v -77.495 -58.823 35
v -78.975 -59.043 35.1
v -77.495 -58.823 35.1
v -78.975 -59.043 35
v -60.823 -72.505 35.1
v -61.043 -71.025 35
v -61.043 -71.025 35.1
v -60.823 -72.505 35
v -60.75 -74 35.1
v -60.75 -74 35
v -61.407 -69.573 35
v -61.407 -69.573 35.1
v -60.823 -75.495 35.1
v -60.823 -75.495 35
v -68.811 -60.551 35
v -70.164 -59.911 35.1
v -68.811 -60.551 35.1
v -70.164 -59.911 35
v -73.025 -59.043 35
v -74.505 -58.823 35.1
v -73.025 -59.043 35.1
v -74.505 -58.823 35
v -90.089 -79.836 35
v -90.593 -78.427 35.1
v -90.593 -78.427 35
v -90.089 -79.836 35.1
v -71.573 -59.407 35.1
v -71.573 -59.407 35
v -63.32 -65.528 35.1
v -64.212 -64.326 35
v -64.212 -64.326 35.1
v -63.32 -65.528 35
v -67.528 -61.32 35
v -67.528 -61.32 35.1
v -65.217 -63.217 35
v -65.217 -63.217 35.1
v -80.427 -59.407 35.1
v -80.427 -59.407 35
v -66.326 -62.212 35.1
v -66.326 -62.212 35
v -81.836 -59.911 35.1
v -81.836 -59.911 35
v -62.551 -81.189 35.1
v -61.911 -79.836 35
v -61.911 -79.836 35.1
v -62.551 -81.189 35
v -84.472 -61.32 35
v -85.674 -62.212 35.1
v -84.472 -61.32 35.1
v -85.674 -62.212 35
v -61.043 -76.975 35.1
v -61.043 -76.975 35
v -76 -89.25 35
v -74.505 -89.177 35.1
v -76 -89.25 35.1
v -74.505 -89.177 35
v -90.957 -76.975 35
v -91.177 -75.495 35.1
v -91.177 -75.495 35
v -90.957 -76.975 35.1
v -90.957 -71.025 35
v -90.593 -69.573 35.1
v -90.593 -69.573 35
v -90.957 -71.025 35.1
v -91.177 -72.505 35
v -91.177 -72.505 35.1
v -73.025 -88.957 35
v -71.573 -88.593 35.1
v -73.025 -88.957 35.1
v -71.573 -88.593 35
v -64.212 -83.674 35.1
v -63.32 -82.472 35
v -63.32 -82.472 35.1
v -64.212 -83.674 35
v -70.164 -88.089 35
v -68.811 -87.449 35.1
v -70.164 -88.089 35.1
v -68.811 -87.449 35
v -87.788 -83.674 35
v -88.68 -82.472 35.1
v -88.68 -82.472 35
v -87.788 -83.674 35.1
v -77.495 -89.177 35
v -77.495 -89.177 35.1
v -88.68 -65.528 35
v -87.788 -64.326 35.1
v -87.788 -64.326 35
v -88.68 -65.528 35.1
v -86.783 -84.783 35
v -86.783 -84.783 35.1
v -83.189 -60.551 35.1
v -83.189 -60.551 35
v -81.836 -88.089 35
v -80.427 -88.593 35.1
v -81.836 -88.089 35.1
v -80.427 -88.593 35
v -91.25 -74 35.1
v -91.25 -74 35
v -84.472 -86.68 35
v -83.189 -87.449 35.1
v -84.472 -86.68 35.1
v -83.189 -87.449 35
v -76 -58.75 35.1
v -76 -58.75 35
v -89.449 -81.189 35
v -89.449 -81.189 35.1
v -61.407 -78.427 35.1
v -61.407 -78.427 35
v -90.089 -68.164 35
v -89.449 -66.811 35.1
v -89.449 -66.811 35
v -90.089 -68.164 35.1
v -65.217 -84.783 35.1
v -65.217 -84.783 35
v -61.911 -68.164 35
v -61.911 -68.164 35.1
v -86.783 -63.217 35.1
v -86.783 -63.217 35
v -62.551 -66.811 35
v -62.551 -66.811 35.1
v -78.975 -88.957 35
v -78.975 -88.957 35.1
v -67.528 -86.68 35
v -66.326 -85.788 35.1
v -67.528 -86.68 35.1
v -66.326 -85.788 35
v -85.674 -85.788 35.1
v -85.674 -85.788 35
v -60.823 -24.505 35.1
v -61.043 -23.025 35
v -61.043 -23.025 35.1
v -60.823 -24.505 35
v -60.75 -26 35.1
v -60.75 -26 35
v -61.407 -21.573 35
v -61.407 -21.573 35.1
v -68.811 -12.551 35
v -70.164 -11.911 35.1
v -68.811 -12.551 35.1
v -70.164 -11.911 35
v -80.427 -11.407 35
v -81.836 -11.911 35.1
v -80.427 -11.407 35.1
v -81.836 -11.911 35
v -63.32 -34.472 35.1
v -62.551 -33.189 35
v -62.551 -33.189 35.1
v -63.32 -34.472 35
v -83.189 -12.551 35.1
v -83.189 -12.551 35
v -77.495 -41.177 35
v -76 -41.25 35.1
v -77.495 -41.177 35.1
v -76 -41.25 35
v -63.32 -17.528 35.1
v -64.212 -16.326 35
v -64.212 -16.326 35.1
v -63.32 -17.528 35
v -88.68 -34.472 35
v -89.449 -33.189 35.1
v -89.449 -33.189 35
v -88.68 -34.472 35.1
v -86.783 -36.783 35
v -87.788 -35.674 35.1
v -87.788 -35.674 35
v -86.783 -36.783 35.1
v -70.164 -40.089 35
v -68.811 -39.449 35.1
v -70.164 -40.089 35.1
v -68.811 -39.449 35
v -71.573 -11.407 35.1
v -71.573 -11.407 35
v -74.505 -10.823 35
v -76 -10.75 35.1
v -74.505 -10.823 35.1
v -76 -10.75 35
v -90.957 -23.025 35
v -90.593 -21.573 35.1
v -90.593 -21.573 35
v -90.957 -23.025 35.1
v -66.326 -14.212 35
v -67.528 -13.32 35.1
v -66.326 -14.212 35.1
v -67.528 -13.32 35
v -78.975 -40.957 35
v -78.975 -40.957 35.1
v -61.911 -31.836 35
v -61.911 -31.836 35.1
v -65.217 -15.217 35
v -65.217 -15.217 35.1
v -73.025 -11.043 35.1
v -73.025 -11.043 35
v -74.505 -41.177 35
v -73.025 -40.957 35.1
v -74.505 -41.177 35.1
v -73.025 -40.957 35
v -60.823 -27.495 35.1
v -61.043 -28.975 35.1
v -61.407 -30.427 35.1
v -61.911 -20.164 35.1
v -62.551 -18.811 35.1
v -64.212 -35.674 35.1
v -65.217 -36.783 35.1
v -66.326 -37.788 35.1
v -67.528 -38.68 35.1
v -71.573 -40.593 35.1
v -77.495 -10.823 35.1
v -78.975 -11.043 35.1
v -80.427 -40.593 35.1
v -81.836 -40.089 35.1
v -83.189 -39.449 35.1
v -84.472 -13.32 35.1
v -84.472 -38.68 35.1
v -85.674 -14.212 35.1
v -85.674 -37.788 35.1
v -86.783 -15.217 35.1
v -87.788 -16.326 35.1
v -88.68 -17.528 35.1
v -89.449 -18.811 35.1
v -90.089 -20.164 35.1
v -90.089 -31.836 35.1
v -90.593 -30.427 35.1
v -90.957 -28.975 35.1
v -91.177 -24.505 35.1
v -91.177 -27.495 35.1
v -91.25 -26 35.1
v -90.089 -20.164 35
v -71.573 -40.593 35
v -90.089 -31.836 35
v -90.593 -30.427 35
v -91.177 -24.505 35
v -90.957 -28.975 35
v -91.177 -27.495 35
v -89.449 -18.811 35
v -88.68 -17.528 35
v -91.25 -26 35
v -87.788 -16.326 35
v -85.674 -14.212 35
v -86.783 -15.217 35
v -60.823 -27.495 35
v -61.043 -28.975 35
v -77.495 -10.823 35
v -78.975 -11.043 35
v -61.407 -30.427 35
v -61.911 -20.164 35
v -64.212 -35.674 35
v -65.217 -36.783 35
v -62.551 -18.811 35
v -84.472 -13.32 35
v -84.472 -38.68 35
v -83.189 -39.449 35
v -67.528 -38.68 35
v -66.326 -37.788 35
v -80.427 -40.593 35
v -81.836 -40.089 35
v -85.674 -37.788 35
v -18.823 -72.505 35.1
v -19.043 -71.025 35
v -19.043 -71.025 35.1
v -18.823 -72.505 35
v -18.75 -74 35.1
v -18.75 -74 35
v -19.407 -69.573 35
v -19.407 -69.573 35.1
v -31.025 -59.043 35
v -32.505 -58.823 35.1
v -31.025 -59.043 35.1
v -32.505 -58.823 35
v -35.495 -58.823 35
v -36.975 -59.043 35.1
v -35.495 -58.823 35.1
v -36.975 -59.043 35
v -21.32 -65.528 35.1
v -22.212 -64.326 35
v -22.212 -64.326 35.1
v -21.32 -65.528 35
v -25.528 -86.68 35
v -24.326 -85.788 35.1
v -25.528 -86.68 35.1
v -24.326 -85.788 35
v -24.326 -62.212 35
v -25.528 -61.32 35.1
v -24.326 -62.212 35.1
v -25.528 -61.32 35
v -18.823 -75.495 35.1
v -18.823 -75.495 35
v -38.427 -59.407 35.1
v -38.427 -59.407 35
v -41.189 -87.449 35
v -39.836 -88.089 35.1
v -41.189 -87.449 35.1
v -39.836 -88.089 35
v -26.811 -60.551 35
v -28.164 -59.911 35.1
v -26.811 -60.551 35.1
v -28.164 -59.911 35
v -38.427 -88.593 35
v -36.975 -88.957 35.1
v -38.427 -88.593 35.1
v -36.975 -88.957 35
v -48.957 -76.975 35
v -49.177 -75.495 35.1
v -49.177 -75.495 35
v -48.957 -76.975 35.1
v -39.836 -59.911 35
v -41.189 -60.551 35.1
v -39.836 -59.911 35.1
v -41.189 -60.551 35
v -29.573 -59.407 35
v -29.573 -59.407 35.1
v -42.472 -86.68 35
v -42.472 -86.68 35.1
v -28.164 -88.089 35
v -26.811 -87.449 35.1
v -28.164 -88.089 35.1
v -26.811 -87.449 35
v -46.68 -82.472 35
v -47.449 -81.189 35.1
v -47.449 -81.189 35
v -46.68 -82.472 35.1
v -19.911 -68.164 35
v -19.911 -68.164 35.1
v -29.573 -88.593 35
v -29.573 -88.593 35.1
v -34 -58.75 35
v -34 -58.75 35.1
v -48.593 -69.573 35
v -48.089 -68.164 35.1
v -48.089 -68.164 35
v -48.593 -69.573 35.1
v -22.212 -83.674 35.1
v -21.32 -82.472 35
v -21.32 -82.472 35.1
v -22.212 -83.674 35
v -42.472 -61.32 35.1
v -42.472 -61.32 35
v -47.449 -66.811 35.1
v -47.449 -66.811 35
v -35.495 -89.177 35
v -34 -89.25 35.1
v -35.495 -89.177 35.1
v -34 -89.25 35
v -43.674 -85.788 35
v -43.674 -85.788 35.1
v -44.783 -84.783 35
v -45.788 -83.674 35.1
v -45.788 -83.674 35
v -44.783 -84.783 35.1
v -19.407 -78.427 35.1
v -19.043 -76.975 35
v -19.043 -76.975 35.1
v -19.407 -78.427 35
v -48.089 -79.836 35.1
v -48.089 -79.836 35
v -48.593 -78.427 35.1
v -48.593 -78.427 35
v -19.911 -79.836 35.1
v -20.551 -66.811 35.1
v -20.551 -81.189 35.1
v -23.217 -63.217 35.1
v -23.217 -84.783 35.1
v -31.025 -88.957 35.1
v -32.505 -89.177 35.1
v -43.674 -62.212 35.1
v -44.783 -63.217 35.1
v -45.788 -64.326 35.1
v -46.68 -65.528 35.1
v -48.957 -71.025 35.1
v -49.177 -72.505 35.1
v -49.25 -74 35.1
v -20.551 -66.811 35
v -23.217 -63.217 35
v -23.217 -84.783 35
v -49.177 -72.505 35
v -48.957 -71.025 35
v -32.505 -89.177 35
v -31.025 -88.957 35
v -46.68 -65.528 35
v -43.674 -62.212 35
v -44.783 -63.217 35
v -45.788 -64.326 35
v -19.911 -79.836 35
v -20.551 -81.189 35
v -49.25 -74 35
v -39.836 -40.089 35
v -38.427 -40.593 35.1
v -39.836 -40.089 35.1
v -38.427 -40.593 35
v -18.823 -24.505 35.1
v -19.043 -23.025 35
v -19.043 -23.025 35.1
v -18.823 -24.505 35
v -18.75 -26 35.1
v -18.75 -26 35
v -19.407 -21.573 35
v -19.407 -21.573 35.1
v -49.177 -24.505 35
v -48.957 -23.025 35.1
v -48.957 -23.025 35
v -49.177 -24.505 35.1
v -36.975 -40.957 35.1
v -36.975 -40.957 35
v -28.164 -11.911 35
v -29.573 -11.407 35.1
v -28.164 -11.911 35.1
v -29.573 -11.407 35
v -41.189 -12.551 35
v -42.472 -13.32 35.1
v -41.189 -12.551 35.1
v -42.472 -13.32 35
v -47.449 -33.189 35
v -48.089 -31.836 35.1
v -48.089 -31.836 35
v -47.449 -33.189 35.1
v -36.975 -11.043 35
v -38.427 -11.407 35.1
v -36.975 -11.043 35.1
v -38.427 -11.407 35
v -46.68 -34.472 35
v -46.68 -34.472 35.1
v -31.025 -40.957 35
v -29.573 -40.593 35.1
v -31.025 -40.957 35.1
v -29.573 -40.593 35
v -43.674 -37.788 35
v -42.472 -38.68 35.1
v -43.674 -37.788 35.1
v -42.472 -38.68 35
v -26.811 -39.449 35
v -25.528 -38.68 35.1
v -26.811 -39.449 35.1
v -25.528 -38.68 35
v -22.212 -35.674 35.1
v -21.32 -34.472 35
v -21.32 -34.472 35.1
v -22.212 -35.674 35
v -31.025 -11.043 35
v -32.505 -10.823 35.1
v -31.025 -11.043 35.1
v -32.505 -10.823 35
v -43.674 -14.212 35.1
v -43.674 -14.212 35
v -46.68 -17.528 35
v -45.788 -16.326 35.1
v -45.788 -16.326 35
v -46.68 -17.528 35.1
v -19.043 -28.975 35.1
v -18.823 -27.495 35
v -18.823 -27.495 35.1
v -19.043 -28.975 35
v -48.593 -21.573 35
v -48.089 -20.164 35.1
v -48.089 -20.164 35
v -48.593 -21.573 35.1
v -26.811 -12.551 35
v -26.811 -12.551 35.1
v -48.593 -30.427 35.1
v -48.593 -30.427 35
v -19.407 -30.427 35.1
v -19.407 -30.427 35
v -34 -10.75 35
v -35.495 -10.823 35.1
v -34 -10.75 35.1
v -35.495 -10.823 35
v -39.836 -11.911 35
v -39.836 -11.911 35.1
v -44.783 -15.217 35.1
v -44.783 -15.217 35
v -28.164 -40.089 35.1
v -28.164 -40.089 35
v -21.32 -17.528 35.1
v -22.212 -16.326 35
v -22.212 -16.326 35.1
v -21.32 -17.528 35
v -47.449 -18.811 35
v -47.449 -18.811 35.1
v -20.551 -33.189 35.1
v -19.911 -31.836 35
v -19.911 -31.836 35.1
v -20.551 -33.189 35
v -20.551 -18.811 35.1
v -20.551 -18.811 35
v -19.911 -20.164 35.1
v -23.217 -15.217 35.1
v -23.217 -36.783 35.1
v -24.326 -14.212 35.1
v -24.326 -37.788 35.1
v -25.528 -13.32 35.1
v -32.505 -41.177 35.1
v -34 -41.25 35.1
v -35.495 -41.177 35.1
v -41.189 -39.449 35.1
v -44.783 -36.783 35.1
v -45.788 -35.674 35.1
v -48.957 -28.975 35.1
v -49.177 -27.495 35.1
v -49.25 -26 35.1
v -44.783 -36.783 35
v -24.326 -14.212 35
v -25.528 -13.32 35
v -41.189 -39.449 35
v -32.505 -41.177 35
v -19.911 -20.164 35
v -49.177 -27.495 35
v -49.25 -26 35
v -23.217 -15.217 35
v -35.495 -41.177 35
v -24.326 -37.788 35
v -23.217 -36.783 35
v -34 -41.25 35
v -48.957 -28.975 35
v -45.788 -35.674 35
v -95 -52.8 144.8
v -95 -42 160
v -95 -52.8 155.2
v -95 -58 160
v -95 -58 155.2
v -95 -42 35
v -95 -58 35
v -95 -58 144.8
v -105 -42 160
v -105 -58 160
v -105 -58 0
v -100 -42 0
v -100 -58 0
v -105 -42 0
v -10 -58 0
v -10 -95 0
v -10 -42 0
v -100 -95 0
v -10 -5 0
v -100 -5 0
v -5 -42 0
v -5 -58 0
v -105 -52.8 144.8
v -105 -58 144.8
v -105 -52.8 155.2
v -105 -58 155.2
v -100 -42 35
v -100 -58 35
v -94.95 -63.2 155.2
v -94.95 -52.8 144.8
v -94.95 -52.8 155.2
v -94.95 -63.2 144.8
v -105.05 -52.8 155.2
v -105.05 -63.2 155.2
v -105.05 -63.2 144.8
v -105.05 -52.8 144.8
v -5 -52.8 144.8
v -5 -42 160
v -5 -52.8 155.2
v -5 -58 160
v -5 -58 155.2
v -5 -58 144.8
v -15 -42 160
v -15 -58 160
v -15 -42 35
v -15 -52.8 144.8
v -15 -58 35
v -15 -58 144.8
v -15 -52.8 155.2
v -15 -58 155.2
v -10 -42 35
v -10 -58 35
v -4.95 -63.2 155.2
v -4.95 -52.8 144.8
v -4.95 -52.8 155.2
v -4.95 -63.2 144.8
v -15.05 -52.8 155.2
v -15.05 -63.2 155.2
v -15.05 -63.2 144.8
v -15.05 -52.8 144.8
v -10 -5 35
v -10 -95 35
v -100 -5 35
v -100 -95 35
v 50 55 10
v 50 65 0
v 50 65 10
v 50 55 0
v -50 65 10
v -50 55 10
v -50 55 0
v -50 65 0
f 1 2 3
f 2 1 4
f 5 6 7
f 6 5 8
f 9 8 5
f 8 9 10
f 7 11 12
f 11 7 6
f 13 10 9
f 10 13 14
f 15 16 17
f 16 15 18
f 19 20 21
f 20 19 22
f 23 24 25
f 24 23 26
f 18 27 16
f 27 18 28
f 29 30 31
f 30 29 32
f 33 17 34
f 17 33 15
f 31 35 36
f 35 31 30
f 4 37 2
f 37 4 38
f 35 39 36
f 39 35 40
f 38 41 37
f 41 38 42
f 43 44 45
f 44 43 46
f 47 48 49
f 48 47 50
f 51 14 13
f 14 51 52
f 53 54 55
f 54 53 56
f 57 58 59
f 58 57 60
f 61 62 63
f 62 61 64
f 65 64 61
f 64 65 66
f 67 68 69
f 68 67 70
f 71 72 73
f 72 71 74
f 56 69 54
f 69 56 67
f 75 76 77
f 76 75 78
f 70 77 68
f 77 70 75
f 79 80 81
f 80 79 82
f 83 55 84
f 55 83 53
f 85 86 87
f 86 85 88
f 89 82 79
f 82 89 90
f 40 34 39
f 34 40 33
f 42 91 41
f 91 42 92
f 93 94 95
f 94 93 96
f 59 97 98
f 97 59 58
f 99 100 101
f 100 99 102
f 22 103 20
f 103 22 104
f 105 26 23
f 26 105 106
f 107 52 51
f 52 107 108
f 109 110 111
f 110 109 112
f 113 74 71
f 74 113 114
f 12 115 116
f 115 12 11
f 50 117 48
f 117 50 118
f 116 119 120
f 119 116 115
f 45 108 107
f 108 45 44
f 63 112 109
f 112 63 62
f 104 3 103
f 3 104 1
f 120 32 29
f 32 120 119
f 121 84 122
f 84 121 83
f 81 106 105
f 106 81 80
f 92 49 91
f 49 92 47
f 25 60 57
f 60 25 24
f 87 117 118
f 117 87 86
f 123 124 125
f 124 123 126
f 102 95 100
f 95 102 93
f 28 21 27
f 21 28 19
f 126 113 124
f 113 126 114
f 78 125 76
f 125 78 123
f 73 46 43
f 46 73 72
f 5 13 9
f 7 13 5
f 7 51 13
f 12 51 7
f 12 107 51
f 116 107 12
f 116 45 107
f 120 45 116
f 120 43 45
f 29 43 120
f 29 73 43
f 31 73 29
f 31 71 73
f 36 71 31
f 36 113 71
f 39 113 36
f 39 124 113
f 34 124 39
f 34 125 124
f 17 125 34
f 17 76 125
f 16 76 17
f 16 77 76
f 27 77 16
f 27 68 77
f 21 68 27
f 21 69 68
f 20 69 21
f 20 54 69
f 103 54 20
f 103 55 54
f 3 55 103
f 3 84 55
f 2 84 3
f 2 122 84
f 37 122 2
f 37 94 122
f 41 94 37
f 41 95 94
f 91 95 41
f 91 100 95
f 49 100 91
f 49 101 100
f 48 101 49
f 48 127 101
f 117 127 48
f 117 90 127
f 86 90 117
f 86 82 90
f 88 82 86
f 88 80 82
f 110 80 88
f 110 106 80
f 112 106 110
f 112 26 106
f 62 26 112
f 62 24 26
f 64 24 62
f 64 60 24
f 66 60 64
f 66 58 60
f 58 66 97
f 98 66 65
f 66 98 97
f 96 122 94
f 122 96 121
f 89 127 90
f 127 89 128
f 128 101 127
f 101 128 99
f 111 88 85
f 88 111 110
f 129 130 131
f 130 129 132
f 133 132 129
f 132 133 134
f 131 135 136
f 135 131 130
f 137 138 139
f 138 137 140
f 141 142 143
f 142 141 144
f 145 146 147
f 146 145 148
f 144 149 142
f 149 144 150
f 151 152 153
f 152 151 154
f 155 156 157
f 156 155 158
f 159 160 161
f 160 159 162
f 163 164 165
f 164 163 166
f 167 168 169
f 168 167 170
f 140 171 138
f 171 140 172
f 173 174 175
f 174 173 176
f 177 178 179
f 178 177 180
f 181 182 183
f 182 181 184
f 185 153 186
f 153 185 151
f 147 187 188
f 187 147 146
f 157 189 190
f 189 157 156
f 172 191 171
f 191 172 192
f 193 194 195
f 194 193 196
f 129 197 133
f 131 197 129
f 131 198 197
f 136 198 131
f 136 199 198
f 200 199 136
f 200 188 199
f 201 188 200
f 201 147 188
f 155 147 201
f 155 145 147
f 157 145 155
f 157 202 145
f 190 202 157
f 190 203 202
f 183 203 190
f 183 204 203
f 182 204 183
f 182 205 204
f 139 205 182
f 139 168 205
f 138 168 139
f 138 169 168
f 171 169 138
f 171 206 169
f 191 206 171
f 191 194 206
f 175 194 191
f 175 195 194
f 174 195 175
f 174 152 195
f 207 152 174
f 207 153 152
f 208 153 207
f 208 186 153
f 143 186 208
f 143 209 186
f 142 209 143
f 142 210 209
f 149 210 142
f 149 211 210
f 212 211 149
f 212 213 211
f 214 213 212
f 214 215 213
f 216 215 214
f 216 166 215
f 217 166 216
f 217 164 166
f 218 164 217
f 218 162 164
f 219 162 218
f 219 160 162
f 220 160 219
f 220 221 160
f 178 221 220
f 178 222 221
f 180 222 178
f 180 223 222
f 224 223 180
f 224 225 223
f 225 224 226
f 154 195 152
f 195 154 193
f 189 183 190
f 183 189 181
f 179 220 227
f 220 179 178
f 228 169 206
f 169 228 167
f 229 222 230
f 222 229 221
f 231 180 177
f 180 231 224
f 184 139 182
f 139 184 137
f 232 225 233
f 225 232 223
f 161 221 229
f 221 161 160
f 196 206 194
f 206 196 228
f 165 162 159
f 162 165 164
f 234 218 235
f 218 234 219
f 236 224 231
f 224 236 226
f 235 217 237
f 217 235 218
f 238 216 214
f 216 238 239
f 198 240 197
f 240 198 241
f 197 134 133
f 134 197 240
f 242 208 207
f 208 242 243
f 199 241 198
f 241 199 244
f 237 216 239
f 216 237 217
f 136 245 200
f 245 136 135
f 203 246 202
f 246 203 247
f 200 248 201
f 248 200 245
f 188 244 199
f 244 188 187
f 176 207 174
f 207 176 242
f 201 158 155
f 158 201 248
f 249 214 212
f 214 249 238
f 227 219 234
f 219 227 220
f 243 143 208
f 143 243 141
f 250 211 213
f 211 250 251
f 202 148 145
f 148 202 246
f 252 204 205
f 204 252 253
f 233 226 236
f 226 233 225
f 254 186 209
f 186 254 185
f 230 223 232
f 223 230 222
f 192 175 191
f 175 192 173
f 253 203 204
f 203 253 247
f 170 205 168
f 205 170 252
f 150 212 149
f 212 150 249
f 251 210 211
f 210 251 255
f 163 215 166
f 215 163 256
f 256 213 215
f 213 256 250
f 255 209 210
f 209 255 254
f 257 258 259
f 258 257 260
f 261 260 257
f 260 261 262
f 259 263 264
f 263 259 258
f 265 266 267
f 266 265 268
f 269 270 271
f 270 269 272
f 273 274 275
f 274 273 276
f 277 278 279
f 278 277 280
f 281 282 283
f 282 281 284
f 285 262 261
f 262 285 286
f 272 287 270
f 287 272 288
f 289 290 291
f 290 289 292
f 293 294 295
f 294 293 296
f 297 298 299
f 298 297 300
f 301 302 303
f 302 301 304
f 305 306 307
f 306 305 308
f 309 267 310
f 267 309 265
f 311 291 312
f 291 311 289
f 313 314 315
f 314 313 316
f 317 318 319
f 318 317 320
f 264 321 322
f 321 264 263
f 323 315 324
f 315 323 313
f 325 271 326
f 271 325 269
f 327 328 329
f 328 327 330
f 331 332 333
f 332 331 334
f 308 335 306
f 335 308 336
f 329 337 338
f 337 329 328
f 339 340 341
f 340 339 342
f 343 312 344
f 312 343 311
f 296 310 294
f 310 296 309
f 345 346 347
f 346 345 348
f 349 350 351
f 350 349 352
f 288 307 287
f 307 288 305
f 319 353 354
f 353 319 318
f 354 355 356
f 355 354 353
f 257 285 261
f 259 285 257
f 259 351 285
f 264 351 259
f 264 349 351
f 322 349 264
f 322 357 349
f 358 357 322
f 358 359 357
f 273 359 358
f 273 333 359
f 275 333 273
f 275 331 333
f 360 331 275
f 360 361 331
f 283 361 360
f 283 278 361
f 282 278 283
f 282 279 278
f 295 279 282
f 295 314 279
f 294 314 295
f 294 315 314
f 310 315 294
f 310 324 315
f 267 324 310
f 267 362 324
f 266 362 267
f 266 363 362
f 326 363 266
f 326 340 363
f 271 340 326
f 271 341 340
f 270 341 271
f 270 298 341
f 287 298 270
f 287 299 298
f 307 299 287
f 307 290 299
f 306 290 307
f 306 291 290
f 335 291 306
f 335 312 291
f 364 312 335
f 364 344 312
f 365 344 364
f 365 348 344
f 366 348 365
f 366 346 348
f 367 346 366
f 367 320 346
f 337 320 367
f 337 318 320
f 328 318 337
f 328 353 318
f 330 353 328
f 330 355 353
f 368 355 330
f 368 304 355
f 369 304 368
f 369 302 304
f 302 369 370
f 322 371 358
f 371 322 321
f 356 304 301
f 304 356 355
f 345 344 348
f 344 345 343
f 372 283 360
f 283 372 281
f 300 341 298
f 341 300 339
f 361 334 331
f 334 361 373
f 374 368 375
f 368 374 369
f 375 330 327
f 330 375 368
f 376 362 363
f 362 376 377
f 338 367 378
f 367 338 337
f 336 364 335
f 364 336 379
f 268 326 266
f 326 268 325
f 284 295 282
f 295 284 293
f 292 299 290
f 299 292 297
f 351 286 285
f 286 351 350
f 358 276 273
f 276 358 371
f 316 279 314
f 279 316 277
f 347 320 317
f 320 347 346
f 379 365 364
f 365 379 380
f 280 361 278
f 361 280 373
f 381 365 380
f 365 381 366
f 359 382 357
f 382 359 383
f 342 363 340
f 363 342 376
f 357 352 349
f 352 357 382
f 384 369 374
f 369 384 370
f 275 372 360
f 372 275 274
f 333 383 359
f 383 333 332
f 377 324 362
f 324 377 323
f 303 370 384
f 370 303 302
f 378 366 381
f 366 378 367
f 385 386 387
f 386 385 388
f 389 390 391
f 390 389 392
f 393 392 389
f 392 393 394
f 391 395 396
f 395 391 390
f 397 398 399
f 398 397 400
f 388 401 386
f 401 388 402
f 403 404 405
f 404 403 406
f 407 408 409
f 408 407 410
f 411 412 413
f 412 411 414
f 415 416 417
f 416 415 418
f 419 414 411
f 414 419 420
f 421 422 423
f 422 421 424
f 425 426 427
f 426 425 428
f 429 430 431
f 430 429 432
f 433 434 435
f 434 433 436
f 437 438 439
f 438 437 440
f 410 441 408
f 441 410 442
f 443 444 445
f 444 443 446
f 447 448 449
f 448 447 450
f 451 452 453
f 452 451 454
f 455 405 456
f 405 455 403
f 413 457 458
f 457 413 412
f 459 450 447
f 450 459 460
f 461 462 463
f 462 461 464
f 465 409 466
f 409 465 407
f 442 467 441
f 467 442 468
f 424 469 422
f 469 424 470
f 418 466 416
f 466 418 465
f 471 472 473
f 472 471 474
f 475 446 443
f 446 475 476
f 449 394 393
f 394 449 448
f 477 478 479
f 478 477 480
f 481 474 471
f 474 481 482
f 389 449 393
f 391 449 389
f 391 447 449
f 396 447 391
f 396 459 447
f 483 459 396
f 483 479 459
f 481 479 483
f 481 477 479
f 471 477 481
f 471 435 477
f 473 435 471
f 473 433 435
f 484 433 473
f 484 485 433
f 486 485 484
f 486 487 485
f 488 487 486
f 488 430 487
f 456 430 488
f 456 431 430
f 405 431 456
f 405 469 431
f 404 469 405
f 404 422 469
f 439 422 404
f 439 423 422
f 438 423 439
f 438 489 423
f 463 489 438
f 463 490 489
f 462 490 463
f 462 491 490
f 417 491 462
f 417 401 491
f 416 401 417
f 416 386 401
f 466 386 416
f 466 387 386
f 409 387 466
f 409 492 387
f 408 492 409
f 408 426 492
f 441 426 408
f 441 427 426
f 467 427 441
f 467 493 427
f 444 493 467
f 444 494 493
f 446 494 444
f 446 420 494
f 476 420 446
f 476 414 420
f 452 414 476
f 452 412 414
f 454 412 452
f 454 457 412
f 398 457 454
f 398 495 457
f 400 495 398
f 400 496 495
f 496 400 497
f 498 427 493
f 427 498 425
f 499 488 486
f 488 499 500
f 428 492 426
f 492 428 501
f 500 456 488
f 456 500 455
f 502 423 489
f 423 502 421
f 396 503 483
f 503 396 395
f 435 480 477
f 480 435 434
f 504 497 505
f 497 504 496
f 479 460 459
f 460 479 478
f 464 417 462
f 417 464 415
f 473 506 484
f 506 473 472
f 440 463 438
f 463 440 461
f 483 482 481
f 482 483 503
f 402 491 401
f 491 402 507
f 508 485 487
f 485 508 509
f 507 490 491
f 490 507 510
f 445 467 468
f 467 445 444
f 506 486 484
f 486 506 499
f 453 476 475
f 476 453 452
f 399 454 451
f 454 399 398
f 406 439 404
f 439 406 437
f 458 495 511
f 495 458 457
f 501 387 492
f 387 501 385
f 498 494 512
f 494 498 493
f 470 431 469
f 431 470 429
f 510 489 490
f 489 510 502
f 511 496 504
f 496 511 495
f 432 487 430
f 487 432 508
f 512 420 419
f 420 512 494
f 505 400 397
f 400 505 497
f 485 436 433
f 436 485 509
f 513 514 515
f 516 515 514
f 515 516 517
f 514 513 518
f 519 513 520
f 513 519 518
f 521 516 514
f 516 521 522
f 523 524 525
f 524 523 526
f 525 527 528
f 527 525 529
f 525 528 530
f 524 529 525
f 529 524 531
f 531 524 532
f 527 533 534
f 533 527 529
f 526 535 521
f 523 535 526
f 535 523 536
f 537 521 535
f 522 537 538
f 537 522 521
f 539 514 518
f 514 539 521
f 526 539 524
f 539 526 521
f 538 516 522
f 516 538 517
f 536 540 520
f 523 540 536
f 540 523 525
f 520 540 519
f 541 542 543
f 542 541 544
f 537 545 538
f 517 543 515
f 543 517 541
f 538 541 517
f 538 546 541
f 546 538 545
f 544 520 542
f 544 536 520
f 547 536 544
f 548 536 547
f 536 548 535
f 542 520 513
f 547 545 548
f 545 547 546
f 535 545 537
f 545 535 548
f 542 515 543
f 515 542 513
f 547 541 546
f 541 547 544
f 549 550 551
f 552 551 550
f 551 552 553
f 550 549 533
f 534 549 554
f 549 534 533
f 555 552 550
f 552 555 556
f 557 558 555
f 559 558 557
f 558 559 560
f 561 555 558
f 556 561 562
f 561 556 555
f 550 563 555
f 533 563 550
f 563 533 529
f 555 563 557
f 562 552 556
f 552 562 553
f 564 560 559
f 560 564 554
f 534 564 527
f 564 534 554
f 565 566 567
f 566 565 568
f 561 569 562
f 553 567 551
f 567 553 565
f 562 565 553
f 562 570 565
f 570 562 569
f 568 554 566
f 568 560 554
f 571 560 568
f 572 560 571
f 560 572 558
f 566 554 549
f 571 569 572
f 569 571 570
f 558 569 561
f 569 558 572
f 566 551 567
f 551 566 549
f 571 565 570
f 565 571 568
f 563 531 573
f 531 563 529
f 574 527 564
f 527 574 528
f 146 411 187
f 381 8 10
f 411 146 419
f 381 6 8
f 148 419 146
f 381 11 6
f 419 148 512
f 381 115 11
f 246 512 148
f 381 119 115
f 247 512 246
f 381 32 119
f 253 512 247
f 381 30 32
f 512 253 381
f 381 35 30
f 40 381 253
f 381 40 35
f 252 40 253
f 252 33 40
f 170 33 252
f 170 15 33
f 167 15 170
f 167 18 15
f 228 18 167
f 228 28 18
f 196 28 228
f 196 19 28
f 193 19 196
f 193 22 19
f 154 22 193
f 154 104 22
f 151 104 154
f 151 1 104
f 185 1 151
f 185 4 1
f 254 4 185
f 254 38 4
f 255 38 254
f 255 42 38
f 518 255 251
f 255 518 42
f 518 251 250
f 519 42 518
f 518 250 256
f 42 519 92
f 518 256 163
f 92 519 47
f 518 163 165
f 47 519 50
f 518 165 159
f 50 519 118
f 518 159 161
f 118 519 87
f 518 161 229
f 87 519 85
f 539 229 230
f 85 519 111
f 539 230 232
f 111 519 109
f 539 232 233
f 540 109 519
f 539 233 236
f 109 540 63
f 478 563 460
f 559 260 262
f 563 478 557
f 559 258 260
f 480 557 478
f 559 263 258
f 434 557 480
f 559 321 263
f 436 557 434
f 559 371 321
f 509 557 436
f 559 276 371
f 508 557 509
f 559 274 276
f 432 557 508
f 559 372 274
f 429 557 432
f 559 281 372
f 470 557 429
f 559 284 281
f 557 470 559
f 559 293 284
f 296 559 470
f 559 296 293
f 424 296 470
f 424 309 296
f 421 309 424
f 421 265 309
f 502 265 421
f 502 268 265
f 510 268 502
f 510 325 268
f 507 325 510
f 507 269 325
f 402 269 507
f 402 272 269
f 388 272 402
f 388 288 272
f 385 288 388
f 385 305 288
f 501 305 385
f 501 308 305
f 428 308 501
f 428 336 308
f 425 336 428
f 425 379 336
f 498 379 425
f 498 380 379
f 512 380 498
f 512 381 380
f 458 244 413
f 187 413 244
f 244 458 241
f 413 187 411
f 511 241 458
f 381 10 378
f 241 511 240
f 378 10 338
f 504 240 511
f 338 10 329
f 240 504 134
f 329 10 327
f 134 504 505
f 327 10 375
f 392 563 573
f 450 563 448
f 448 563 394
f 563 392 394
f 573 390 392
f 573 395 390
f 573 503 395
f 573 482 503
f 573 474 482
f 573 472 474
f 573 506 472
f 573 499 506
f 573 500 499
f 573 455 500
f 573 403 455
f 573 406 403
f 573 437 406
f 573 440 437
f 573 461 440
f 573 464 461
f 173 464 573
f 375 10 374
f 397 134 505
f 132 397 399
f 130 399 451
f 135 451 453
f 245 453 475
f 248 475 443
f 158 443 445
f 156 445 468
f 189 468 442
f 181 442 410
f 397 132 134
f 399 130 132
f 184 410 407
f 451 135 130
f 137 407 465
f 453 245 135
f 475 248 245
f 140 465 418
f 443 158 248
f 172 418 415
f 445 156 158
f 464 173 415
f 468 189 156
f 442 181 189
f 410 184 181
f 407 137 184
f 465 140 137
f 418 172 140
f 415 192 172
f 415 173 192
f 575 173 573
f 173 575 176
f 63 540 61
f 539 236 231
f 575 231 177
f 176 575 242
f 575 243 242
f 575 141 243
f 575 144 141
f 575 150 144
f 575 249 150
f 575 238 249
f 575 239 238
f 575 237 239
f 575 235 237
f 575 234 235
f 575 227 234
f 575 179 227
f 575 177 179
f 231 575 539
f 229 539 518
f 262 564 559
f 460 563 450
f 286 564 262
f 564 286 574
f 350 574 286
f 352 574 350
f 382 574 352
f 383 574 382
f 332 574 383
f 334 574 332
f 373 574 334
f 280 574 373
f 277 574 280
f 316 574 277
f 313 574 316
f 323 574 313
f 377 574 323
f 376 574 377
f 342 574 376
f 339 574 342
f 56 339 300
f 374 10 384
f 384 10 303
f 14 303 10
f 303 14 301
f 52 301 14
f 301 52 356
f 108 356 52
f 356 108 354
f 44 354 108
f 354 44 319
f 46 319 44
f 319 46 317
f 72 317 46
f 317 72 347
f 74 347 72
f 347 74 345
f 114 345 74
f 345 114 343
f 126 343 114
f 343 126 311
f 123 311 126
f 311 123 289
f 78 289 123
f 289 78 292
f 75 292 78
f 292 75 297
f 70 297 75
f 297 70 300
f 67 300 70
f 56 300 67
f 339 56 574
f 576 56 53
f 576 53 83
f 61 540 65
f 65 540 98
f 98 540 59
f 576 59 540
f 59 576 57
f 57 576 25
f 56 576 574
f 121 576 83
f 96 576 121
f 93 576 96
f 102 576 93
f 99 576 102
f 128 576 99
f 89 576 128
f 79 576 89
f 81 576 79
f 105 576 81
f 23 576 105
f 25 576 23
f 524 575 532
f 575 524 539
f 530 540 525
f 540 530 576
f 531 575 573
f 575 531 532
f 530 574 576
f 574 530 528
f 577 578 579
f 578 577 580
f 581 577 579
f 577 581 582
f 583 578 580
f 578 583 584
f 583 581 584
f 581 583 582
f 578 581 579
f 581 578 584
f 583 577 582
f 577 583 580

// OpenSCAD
// Dimensions for Part 1: Base Block
base_x = 90;
base_y = 90;
base_z = 35;

// Dimensions for Part 1: Tube Seats
seat_diameter = 30.5;
seat_depth = 30;
seat_floor = 5; // base_z - seat_depth
seat_x_pos = 21;
seat_y_pos = 24;

// Dimensions for Part 1: Posts
post_x = 10;
post_y = 16;
post_z = 160;
post_hole_size = 10.4;
post_hole_z = 150;

// Dimensions for Part 2: Handle
handle_x = 100;
handle_y = 10;
handle_z = 10;
handle_y_start = 55;
handle_y_end = 65;

// Global settings
$fn = 64;

// Part 1: Base Block with Seats and Posts
translate([-base_x/2 - post_x/2 - 5, -base_y/2 - 5, 0]) { // Offset Part 1 to the left to print side-by-side
    // Base Block
    translate([-base_x/2, -base_y/2, 0]) {
        cube([base_x, base_y, base_z], center = false);
    }
    
    // Tube Seats (Blind Holes)
    for (sx = [-seat_x_pos, seat_x_pos]) {
        for (sy = [-seat_y_pos, seat_y_pos]) {
            translate([sx, sy, seat_floor]) {
                cylinder(r = seat_diameter/2, h = seat_depth + 0.1, center = false); // +0.1 to ensure cut goes through
            }
        }
    }
    
    // Posts
    // Left Post
    translate([-base_x/2 - post_x/2, -post_y/2, 0]) {
        cube([post_x, post_y, post_z], center = false);
        // Hole in Left Post
        translate([post_x/2, 0, post_hole_z]) {
            cube([post_x + 0.1, post_hole_size, post_hole_size], center = true); // +0.1 to ensure cut goes through
        }
    }
    
    // Right Post
    translate([base_x/2 - post_x/2, -post_y/2, 0]) {
        cube([post_x, post_y, post_z], center = false);
        // Hole in Right Post
        translate([post_x/2, 0, post_hole_z]) {
            cube([post_x + 0.1, post_hole_size, post_hole_size], center = true); // +0.1 to ensure cut goes through
        }
    }
}

// Part 2: Handle
translate([0, (handle_y_start + handle_y_end)/2, handle_z/2]) { // Center handle in Y and Z
    translate([-handle_x/2, -handle_y/2, -handle_z/2]) {
        cube([handle_x, handle_y, handle_z], center = false);
    }
}
